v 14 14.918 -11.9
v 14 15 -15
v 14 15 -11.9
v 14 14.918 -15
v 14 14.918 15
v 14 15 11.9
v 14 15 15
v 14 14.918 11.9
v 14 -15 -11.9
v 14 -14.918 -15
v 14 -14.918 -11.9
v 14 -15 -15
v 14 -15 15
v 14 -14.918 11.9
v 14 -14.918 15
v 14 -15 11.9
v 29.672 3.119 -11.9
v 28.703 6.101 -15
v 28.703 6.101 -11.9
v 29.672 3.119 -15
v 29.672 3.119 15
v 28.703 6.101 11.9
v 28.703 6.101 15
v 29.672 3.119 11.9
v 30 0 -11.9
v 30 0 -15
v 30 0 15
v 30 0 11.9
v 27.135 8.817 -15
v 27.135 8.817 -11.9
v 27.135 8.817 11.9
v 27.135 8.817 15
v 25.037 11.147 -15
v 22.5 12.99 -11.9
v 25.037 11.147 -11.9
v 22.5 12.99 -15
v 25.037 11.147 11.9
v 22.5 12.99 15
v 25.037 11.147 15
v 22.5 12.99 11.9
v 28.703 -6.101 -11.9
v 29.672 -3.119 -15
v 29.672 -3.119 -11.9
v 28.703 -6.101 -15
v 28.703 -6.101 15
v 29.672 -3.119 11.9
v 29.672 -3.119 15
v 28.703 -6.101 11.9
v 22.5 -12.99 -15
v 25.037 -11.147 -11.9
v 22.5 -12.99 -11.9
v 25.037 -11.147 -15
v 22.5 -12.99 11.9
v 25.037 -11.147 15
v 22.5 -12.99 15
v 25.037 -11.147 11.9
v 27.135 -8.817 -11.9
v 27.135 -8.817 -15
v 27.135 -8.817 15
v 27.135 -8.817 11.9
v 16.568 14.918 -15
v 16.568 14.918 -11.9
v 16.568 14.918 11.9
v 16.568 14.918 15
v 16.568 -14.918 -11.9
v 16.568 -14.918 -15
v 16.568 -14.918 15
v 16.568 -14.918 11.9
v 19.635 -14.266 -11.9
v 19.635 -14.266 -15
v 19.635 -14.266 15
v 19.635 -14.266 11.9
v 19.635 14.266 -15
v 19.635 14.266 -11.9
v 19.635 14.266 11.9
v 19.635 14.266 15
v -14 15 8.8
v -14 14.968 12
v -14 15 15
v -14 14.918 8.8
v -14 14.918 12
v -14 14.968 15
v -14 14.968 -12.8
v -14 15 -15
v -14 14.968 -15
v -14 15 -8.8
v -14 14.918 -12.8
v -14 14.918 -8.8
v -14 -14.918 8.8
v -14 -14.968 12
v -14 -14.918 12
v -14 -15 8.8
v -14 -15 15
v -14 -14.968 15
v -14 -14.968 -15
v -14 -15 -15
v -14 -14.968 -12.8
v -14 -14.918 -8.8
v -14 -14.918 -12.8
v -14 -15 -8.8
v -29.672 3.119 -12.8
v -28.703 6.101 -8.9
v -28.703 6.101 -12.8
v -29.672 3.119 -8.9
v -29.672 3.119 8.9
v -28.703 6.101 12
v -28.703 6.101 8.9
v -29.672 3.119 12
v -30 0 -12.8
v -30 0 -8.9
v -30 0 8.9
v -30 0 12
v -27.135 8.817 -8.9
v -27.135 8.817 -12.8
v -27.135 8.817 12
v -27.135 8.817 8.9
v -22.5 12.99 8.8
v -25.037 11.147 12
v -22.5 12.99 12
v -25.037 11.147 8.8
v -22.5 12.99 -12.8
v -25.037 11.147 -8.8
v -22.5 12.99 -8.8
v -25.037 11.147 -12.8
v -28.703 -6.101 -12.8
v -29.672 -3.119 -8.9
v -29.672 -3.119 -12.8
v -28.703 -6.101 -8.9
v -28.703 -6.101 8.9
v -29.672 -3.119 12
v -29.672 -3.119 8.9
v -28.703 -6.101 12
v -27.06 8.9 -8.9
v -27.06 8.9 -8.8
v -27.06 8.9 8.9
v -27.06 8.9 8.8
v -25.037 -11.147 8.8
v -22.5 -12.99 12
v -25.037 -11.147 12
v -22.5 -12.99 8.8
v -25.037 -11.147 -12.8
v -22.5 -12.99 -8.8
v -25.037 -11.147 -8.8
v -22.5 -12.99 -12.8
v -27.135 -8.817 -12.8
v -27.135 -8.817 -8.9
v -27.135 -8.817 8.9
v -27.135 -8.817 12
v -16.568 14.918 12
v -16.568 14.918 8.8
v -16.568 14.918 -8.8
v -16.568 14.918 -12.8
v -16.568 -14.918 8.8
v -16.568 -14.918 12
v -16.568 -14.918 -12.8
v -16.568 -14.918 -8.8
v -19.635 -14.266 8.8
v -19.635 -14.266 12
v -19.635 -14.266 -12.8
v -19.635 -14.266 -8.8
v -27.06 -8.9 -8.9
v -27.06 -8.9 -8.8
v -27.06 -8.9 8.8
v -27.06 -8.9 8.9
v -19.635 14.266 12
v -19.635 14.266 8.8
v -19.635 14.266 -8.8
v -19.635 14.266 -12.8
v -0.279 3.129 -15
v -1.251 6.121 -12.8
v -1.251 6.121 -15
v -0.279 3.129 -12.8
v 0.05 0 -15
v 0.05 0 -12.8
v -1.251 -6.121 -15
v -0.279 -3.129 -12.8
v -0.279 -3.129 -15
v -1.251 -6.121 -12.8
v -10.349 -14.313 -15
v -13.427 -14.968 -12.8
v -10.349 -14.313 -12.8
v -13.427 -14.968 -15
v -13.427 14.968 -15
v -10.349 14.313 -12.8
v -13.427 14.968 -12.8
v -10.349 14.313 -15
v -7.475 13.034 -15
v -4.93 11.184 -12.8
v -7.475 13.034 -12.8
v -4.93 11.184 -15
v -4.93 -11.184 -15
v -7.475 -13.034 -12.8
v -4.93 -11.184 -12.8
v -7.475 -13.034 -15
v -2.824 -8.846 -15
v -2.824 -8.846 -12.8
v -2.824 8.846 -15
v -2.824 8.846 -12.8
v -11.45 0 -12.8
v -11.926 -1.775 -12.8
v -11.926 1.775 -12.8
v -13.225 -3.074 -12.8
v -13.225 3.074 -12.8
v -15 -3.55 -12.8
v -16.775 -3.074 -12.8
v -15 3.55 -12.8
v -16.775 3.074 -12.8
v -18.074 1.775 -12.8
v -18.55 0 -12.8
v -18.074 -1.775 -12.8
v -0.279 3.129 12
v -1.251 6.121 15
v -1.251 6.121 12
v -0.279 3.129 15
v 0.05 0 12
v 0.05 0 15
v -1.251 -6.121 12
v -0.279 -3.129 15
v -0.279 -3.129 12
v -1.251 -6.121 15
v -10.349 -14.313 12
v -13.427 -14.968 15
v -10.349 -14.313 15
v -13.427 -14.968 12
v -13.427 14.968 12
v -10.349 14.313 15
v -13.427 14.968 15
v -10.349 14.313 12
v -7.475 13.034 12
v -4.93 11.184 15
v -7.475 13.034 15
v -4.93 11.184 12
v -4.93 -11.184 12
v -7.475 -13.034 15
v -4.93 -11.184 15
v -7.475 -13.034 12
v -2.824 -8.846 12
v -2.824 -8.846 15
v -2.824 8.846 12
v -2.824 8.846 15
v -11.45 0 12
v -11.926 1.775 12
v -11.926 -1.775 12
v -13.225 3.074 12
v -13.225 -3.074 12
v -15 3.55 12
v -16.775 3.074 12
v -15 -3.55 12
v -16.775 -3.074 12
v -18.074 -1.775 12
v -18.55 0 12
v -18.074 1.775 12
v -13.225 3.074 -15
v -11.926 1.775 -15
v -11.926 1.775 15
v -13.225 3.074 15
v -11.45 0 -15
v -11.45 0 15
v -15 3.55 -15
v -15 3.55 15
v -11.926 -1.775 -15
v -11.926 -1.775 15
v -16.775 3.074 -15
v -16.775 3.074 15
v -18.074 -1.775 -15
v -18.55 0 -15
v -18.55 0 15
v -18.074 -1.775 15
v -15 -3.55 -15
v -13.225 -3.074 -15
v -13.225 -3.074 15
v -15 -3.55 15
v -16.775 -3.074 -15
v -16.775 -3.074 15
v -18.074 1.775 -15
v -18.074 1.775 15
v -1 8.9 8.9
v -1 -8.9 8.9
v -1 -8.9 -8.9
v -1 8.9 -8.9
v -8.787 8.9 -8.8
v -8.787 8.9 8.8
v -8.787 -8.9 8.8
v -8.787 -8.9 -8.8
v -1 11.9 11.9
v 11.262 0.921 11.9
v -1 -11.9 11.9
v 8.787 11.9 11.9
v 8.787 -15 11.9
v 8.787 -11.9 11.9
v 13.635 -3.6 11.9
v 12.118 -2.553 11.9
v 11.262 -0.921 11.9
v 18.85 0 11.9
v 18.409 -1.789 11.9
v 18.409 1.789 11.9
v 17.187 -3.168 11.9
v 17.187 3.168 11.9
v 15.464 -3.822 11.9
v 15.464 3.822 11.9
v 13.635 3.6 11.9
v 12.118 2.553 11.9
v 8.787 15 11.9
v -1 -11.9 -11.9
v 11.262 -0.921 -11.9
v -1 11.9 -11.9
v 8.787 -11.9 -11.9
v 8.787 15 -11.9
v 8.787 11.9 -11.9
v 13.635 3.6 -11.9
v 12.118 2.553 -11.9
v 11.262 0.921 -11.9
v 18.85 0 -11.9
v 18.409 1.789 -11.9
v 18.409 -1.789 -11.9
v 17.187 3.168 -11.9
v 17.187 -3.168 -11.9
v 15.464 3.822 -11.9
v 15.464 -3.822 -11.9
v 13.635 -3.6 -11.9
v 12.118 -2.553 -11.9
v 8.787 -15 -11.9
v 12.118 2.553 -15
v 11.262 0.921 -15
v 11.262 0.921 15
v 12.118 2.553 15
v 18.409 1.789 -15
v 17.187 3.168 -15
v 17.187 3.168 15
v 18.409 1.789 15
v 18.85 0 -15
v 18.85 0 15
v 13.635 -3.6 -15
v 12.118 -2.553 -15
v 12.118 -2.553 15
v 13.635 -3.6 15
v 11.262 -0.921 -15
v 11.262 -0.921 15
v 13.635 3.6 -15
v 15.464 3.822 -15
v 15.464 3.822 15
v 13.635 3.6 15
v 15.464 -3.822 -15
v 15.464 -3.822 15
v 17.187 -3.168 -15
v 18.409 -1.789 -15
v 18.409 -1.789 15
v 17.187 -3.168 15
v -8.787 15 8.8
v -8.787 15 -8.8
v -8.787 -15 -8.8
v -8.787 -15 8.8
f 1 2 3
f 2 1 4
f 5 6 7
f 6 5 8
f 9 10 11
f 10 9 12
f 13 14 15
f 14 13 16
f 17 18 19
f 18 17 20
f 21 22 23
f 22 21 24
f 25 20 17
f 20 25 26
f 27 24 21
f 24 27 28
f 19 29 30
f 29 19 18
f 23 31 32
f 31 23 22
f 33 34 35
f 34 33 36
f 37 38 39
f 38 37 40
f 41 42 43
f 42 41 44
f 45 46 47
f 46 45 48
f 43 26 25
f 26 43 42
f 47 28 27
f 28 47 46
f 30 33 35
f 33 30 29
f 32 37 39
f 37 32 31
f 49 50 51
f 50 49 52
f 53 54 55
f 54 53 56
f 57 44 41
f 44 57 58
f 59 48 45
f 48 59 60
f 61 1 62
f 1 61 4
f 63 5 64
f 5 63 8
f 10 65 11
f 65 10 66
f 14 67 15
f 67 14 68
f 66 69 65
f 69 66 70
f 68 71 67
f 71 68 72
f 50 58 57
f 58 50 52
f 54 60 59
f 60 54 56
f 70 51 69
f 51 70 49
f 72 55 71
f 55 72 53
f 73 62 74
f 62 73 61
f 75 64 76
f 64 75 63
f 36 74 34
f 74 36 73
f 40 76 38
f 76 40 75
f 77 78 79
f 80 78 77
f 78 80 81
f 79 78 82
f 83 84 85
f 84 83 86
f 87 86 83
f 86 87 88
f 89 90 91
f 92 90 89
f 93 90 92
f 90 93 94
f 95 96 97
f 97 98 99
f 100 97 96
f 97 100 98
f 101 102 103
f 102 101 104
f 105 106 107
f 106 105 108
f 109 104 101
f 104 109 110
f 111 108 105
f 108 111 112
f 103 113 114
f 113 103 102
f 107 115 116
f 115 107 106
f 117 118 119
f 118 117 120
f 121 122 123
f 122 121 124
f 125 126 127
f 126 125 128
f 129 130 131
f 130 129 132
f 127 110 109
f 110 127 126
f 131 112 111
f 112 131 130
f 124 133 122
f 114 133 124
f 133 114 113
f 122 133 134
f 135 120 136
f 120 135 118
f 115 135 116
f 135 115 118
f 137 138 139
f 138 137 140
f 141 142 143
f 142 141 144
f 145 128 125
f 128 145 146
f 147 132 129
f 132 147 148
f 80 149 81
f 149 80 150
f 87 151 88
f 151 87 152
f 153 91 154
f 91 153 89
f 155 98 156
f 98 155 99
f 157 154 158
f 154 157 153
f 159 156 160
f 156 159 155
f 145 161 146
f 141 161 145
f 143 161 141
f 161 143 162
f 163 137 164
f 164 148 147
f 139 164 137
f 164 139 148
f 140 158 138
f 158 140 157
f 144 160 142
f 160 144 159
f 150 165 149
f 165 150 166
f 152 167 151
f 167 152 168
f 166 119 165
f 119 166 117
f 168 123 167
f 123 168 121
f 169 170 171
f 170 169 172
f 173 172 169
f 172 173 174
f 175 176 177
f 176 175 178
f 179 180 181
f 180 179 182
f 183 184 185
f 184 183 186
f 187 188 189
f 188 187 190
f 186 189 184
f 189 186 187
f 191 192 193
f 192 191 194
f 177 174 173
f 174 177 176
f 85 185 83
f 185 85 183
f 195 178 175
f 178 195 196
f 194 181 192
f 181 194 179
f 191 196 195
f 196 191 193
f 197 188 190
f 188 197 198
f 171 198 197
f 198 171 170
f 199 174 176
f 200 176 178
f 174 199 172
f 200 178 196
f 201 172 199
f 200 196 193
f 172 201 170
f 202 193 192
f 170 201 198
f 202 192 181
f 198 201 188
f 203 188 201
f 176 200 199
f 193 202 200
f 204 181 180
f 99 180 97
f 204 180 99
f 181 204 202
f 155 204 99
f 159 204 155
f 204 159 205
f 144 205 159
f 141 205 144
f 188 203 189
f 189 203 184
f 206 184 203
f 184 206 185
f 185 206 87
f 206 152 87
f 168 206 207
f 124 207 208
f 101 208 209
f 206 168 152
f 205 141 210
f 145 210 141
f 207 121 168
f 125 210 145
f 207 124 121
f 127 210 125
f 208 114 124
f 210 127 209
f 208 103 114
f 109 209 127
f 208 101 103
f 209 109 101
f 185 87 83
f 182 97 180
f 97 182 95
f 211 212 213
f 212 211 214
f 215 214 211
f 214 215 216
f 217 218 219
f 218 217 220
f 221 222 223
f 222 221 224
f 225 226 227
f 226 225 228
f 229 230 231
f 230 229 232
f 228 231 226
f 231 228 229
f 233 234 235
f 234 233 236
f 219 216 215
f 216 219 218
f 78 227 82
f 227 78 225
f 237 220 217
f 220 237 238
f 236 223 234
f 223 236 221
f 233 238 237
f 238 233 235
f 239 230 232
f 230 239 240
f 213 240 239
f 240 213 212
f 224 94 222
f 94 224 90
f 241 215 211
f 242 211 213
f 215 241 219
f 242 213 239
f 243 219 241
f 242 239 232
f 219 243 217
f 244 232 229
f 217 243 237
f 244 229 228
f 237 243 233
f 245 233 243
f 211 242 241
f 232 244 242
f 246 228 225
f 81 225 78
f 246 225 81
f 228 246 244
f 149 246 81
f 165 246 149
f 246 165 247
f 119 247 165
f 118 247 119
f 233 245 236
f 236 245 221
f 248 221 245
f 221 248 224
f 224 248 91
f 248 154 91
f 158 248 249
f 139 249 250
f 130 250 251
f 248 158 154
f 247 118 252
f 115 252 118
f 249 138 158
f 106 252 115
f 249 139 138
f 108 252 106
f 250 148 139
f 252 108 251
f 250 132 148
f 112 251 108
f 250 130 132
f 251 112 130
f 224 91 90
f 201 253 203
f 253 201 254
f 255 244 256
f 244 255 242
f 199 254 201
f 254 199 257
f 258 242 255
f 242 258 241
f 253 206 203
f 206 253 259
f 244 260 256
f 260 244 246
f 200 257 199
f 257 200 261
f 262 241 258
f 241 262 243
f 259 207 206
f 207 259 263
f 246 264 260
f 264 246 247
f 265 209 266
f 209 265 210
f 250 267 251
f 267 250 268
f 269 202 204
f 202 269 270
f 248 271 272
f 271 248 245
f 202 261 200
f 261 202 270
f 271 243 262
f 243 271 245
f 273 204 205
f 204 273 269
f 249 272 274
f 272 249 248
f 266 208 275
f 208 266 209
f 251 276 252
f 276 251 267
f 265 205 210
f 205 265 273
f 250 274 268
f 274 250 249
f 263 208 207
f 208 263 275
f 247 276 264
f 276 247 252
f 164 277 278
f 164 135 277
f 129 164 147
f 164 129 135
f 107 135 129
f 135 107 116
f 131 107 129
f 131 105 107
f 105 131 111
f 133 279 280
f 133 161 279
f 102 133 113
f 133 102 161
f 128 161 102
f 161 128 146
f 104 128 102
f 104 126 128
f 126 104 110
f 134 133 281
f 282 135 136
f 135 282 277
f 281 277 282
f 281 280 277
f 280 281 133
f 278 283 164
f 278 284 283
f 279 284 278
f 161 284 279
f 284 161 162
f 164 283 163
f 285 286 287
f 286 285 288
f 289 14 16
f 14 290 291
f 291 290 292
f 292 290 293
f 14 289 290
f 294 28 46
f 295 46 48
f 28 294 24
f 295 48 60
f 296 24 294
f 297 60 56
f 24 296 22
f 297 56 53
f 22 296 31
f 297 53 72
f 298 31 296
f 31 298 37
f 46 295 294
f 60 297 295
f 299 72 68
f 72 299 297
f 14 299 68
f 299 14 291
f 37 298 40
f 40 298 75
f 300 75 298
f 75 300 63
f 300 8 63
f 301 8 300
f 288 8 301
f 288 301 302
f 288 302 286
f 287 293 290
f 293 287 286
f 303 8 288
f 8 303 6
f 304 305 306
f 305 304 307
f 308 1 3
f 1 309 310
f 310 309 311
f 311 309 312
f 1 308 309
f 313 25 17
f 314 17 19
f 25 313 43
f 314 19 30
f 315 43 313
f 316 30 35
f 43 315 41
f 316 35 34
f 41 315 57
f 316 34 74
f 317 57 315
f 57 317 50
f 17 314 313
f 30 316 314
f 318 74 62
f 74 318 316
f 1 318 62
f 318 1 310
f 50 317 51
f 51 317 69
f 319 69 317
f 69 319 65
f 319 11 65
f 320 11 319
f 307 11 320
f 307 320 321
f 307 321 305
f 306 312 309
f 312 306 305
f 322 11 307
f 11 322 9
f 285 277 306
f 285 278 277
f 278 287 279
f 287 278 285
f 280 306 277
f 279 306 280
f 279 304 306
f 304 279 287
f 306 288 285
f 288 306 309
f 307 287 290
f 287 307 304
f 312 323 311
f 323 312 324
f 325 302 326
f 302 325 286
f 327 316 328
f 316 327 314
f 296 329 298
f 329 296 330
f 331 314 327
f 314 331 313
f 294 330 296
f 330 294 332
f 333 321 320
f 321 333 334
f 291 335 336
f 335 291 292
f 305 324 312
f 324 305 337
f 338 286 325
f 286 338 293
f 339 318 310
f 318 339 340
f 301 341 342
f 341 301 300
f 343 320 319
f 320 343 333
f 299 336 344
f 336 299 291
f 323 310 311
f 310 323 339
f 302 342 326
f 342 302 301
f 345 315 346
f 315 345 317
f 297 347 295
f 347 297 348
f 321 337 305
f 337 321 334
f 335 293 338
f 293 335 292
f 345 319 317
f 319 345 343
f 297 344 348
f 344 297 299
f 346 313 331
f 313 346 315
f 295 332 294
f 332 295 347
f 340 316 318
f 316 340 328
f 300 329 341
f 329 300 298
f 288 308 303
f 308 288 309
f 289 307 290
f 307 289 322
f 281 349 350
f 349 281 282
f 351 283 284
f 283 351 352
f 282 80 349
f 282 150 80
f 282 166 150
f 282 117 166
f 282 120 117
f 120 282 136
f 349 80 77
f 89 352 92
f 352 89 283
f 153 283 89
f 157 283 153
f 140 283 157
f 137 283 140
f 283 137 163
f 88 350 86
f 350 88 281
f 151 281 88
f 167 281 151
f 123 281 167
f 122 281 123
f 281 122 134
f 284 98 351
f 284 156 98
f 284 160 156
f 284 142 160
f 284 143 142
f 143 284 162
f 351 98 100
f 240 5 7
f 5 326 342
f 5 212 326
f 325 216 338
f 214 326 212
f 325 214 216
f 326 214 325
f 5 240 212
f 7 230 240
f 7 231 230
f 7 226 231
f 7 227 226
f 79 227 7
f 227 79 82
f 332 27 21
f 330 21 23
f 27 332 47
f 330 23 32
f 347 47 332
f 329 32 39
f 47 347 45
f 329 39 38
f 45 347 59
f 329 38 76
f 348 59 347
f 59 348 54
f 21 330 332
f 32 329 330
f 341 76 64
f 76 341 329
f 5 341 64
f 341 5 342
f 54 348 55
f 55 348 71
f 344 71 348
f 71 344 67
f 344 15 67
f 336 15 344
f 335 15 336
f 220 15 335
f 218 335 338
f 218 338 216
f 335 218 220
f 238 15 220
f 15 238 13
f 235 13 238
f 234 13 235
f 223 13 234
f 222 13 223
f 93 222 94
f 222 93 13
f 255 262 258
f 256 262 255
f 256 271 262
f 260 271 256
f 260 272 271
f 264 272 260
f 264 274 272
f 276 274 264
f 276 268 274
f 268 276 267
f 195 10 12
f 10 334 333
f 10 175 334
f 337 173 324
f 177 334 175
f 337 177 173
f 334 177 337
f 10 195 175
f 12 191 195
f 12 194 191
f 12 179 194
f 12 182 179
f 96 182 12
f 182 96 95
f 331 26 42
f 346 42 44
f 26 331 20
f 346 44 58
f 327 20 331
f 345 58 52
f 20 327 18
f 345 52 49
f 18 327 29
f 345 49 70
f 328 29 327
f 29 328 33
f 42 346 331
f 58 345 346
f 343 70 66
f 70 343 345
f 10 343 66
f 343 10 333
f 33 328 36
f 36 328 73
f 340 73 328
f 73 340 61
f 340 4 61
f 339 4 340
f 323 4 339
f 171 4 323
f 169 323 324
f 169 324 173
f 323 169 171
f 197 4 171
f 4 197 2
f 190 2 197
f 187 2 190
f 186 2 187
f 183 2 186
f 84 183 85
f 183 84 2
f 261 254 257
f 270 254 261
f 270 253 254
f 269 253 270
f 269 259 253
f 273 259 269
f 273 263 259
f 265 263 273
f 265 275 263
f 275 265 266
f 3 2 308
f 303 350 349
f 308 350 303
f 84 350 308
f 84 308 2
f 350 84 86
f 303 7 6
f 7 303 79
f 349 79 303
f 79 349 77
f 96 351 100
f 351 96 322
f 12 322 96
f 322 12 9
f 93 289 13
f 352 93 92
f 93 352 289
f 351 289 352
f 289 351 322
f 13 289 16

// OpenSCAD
chainlink(length = 60,width = 30, height= 30 , wall=3);
//translate([50,0,0]) runden(width = 30, height= 30);
module chainlink(length = 25,width= 16.6, height=20, wall= 2, angle = 45,tol=.2)
{

  difference()
  {
    union()
    {
      cube([length,width, height],center = true);//base cube
    }
    union()
    {
      cube([length+4,width-4*wall-tol, height-4*wall-tol],center = true);//evider
      translate([length/4,0,0])
        cube([length/2+2,width-2*wall-tol, height-2*wall-tol],center = true);//evider cote grand
      translate([height/2,0,-height/2])
        runden(width = 30, height= 30);//abrunden
      translate([-height/2,0,height/2])
        rotate([0,180,0])
        runden(width = 30, height= 30);
      translate([length/4,0,-height/2-1])
        cylinder(d=height/4+tol,h=width+4);
      //articulation enfoncee
      difference()
      {
        union()
        {
          translate([-length/4,0,-height/2-1])
            cylinder(d=height+tol/2,h=wall+tol);
          translate([-length/4,0,height/2-wall])
            cylinder(d=height+tol/2,h=wall+tol);
        }
        translate([-length/4,0,-height/2-1])
          cylinder(d=height/4-2*tol,h=width+4);
      }
      //angle freedom big side
      translate([length-height*sin(angle),0,0])
        cube([length,width+wall+2, height-2*wall-tol],center = true);//base cube
      //angle freedom small side
      translate([-length+height*sin(angle),0,0])
        cube([length,width+wall+2, height-4*wall-2*tol],center = true);//base cube
    }
  }

}//module chainlink(width, height, wall)
module runden(height=20,width= 16.6)
{
  difference()
  {
    translate([height/2,0,height/2])
      cube([height+2,width+2, height+2],center = true);//base cube
    translate([0,0,-2])
      cylinder(d=height,h=width+8);
  }
}//module runden(height=20,width= 16.6)
